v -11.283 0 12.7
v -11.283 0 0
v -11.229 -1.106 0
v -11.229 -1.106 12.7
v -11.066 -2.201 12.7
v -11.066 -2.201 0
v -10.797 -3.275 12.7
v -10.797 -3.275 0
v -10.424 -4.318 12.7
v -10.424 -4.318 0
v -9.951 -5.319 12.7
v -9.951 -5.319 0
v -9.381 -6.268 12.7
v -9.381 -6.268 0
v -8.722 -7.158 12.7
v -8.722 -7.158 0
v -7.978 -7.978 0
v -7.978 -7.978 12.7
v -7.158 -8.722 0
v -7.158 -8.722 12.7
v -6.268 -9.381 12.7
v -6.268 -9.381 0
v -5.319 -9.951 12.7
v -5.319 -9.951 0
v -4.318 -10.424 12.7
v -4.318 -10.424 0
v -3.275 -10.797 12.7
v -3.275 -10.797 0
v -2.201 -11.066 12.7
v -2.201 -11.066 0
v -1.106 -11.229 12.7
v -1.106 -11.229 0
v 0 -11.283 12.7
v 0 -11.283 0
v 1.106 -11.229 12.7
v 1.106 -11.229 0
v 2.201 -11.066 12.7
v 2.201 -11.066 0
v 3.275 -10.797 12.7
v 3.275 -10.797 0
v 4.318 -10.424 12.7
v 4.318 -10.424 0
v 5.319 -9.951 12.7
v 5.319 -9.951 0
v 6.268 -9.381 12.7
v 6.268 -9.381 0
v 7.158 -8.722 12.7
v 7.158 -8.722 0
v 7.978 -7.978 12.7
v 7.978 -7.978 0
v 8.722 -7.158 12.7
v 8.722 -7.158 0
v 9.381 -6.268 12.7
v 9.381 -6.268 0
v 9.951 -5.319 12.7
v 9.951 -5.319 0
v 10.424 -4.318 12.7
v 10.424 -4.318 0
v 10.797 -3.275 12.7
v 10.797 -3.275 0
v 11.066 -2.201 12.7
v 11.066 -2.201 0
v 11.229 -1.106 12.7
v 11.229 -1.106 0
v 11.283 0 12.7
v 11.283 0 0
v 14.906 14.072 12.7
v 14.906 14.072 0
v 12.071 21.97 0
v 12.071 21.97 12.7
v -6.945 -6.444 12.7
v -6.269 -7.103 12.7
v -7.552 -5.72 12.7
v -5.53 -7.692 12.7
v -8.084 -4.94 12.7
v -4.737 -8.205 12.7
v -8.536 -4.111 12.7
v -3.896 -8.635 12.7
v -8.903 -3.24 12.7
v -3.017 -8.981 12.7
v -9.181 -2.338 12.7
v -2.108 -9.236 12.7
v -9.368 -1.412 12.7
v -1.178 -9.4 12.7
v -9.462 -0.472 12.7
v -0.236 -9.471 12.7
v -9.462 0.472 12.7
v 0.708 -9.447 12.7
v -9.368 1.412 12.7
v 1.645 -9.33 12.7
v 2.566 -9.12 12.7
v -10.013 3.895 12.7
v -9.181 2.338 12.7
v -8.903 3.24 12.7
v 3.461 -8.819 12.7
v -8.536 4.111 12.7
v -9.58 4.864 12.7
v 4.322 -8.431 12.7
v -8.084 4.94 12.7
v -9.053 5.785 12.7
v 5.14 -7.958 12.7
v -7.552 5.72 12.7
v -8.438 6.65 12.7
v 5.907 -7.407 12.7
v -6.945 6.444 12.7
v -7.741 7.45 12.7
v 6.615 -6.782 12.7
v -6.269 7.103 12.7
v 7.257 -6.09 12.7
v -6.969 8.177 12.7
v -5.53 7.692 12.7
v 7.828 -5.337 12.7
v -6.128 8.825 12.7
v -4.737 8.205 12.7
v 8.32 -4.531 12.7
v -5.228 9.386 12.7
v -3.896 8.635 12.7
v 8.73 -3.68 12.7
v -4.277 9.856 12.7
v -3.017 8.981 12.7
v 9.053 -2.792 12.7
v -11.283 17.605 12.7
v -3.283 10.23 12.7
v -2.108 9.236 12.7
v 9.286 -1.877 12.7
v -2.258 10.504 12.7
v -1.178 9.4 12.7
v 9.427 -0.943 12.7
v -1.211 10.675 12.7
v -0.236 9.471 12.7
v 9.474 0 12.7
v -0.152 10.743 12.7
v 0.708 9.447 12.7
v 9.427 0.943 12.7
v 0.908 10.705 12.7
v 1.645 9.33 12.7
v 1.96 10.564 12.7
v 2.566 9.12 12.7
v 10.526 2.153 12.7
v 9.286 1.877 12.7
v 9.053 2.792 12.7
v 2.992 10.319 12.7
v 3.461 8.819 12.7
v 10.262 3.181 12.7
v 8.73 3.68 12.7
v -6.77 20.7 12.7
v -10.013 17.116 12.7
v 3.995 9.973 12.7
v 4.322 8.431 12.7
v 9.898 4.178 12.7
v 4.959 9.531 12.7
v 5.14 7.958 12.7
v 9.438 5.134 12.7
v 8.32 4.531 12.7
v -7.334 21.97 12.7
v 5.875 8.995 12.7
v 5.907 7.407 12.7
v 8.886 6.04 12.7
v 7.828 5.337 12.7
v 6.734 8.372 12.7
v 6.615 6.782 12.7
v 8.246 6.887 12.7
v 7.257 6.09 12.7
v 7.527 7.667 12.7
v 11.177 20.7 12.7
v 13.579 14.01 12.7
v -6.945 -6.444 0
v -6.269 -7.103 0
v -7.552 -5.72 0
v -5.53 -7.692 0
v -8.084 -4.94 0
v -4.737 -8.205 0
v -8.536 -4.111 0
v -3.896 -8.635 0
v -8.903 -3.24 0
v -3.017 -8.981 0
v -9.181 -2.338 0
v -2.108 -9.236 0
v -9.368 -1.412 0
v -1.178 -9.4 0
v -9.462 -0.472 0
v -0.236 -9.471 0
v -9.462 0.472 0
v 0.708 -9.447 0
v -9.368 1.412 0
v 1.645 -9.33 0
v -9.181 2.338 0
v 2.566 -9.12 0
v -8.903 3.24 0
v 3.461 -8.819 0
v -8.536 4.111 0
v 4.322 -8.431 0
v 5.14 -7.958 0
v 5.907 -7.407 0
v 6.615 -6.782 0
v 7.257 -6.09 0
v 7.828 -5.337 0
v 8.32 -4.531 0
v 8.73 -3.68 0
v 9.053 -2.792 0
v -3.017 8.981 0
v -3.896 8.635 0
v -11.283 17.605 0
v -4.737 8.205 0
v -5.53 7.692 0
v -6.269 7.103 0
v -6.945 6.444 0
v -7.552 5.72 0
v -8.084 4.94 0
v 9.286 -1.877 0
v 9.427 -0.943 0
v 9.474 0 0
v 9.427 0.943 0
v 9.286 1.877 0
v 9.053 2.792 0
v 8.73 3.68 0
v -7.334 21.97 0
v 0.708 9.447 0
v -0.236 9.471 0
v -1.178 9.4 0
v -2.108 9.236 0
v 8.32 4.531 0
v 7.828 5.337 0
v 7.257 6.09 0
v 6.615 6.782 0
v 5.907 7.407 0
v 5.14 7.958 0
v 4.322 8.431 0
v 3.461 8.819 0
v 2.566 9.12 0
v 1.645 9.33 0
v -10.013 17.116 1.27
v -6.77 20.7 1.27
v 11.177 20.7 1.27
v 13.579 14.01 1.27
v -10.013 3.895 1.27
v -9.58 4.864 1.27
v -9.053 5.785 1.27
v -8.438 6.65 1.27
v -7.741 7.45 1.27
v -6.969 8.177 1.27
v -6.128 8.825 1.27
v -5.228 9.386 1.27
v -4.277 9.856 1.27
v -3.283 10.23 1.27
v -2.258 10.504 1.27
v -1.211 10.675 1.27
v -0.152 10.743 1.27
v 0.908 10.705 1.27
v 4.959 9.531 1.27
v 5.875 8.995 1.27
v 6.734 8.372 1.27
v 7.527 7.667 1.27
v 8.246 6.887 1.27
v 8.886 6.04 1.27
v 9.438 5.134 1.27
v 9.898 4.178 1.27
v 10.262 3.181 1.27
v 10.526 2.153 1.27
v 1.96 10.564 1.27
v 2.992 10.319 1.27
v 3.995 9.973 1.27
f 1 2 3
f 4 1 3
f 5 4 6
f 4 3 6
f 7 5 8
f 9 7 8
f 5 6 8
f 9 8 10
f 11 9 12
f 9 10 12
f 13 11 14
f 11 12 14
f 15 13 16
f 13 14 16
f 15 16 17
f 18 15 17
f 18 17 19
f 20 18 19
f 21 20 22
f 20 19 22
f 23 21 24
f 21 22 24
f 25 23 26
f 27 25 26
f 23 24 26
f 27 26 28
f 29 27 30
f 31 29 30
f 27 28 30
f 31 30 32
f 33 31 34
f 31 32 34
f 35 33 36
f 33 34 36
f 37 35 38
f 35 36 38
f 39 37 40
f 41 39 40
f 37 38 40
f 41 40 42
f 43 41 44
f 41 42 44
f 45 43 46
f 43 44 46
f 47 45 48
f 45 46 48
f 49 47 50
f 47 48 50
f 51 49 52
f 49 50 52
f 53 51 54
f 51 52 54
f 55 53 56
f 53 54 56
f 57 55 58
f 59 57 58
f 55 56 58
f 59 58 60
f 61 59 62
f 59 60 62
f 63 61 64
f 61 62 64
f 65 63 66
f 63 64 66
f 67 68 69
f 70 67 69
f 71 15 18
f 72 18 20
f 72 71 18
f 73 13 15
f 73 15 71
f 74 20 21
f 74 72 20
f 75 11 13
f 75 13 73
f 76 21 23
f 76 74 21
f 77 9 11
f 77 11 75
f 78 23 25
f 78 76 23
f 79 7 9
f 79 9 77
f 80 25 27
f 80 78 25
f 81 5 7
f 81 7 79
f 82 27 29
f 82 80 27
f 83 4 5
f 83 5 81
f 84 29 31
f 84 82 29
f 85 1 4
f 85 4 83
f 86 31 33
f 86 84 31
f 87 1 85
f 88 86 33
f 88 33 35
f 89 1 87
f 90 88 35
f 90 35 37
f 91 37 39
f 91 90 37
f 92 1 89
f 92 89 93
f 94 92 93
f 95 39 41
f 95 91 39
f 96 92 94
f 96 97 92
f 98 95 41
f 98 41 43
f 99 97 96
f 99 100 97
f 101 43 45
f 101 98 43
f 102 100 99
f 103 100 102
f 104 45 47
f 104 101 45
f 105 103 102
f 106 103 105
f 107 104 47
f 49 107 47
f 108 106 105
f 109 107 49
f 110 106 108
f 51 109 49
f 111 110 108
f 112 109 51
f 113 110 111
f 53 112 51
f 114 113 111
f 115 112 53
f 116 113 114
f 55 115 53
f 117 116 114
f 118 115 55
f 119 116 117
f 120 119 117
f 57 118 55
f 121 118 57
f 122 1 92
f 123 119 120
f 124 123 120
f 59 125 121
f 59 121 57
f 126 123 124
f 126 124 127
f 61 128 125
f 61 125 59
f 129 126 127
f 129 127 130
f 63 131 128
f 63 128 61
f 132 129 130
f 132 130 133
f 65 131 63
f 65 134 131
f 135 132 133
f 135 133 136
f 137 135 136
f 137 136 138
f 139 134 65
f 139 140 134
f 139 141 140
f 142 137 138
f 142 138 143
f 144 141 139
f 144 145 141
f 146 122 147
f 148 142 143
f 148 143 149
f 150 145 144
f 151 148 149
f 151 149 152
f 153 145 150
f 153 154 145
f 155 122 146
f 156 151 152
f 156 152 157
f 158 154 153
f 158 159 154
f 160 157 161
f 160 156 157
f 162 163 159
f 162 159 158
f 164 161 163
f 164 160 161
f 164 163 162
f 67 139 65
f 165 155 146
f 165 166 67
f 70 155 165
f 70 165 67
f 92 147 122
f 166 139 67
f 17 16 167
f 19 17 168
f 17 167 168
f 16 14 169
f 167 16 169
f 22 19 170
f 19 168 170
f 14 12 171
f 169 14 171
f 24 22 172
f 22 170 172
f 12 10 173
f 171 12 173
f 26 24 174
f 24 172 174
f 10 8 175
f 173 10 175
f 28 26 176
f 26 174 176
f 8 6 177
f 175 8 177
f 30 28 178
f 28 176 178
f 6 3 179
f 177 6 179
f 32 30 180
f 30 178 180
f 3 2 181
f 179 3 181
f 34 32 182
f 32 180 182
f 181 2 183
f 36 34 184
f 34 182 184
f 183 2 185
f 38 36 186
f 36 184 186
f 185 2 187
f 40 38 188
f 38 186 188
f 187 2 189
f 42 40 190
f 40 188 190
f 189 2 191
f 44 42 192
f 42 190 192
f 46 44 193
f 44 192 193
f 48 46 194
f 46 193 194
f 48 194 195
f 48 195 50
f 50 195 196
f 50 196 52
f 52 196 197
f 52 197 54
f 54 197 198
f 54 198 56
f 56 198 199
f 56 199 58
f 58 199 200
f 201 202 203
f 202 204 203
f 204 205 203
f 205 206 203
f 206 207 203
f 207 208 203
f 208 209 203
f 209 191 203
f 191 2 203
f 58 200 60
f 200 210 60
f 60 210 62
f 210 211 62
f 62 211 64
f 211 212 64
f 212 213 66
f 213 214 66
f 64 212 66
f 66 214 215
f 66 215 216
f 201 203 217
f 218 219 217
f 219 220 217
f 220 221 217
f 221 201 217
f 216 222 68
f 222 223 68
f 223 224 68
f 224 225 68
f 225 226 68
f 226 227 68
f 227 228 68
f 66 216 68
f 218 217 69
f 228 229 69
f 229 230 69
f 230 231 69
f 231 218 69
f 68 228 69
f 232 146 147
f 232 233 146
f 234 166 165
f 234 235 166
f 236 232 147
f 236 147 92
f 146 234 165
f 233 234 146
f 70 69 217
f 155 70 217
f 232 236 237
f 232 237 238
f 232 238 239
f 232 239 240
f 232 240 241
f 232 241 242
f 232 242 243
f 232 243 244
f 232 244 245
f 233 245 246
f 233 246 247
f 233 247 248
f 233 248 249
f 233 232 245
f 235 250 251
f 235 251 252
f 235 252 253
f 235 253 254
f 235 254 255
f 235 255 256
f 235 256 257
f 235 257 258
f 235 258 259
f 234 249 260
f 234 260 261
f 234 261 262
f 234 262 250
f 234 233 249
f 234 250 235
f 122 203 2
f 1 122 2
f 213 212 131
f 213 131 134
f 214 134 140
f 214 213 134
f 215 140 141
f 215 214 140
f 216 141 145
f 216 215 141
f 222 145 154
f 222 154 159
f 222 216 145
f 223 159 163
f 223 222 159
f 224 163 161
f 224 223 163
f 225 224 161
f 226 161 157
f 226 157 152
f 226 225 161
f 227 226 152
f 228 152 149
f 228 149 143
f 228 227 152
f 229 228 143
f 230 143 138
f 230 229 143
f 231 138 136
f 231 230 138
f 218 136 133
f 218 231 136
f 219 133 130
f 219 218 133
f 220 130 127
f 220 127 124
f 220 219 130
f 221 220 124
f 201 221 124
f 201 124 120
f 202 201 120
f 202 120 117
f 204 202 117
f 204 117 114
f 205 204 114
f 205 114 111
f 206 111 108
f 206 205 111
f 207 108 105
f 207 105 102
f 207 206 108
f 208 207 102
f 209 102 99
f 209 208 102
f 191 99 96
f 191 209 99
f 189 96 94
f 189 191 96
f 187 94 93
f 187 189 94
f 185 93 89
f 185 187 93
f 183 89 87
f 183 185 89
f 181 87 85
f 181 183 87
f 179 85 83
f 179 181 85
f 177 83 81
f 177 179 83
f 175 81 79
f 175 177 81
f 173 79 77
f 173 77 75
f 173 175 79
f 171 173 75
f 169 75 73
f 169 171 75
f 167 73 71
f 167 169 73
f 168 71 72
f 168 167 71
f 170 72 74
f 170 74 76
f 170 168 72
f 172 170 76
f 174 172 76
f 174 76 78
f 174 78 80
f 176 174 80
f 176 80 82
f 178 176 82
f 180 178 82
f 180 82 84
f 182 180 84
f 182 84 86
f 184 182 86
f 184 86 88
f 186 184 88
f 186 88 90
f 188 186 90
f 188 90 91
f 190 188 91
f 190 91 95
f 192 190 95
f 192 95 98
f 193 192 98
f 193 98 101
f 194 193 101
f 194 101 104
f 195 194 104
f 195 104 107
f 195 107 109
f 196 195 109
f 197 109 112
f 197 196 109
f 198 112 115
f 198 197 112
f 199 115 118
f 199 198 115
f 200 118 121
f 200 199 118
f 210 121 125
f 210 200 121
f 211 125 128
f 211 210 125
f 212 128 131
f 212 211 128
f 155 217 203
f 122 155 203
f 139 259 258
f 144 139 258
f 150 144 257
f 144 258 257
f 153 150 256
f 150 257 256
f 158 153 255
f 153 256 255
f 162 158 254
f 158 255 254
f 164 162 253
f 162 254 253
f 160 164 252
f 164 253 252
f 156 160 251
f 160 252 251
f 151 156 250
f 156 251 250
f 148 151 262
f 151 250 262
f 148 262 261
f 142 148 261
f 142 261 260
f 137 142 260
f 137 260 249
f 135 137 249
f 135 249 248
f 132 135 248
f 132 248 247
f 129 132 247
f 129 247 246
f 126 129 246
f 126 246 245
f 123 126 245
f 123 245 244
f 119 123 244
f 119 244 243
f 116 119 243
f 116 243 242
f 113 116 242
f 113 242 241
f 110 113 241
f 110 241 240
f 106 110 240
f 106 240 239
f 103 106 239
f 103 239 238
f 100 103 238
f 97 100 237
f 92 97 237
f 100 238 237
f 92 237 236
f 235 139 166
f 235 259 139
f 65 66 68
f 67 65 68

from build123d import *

# Parameters (mm, degrees)
F0_R     = 9.473878
F1_DEPTH = 12.7
F2_T     = -1.27


with BuildPart() as f1:
    # F0 (on Top) → F1 (new body)
    with BuildSketch(Plane.XY):
        with BuildLine():
            Line((-11.28285, 17.605154), (-11.28285, 0))
            ThreePointArc((-11.28285, 0), (0, -11.28285), (11.28285, 0))
            Line((11.28285, 0), (14.906, 14.071738))
            Line((14.906, 14.071738), (12.07074, 21.969963))
            Line((12.07074, 21.969963), (-7.333735, 21.969963))
            Line((-7.333735, 21.969963), (-11.28285, 17.605154))
        make_face()
        Circle(F0_R, mode=Mode.SUBTRACT)
    extrude(amount=F1_DEPTH)

    # F2
    f2_openings = [f1.faces().sort_by_distance(p)[0] for p in [
        (1.389795, 10.824441, 12.7),
    ]]
    offset(amount=F2_T, openings=f2_openings)


solid = f1.part
